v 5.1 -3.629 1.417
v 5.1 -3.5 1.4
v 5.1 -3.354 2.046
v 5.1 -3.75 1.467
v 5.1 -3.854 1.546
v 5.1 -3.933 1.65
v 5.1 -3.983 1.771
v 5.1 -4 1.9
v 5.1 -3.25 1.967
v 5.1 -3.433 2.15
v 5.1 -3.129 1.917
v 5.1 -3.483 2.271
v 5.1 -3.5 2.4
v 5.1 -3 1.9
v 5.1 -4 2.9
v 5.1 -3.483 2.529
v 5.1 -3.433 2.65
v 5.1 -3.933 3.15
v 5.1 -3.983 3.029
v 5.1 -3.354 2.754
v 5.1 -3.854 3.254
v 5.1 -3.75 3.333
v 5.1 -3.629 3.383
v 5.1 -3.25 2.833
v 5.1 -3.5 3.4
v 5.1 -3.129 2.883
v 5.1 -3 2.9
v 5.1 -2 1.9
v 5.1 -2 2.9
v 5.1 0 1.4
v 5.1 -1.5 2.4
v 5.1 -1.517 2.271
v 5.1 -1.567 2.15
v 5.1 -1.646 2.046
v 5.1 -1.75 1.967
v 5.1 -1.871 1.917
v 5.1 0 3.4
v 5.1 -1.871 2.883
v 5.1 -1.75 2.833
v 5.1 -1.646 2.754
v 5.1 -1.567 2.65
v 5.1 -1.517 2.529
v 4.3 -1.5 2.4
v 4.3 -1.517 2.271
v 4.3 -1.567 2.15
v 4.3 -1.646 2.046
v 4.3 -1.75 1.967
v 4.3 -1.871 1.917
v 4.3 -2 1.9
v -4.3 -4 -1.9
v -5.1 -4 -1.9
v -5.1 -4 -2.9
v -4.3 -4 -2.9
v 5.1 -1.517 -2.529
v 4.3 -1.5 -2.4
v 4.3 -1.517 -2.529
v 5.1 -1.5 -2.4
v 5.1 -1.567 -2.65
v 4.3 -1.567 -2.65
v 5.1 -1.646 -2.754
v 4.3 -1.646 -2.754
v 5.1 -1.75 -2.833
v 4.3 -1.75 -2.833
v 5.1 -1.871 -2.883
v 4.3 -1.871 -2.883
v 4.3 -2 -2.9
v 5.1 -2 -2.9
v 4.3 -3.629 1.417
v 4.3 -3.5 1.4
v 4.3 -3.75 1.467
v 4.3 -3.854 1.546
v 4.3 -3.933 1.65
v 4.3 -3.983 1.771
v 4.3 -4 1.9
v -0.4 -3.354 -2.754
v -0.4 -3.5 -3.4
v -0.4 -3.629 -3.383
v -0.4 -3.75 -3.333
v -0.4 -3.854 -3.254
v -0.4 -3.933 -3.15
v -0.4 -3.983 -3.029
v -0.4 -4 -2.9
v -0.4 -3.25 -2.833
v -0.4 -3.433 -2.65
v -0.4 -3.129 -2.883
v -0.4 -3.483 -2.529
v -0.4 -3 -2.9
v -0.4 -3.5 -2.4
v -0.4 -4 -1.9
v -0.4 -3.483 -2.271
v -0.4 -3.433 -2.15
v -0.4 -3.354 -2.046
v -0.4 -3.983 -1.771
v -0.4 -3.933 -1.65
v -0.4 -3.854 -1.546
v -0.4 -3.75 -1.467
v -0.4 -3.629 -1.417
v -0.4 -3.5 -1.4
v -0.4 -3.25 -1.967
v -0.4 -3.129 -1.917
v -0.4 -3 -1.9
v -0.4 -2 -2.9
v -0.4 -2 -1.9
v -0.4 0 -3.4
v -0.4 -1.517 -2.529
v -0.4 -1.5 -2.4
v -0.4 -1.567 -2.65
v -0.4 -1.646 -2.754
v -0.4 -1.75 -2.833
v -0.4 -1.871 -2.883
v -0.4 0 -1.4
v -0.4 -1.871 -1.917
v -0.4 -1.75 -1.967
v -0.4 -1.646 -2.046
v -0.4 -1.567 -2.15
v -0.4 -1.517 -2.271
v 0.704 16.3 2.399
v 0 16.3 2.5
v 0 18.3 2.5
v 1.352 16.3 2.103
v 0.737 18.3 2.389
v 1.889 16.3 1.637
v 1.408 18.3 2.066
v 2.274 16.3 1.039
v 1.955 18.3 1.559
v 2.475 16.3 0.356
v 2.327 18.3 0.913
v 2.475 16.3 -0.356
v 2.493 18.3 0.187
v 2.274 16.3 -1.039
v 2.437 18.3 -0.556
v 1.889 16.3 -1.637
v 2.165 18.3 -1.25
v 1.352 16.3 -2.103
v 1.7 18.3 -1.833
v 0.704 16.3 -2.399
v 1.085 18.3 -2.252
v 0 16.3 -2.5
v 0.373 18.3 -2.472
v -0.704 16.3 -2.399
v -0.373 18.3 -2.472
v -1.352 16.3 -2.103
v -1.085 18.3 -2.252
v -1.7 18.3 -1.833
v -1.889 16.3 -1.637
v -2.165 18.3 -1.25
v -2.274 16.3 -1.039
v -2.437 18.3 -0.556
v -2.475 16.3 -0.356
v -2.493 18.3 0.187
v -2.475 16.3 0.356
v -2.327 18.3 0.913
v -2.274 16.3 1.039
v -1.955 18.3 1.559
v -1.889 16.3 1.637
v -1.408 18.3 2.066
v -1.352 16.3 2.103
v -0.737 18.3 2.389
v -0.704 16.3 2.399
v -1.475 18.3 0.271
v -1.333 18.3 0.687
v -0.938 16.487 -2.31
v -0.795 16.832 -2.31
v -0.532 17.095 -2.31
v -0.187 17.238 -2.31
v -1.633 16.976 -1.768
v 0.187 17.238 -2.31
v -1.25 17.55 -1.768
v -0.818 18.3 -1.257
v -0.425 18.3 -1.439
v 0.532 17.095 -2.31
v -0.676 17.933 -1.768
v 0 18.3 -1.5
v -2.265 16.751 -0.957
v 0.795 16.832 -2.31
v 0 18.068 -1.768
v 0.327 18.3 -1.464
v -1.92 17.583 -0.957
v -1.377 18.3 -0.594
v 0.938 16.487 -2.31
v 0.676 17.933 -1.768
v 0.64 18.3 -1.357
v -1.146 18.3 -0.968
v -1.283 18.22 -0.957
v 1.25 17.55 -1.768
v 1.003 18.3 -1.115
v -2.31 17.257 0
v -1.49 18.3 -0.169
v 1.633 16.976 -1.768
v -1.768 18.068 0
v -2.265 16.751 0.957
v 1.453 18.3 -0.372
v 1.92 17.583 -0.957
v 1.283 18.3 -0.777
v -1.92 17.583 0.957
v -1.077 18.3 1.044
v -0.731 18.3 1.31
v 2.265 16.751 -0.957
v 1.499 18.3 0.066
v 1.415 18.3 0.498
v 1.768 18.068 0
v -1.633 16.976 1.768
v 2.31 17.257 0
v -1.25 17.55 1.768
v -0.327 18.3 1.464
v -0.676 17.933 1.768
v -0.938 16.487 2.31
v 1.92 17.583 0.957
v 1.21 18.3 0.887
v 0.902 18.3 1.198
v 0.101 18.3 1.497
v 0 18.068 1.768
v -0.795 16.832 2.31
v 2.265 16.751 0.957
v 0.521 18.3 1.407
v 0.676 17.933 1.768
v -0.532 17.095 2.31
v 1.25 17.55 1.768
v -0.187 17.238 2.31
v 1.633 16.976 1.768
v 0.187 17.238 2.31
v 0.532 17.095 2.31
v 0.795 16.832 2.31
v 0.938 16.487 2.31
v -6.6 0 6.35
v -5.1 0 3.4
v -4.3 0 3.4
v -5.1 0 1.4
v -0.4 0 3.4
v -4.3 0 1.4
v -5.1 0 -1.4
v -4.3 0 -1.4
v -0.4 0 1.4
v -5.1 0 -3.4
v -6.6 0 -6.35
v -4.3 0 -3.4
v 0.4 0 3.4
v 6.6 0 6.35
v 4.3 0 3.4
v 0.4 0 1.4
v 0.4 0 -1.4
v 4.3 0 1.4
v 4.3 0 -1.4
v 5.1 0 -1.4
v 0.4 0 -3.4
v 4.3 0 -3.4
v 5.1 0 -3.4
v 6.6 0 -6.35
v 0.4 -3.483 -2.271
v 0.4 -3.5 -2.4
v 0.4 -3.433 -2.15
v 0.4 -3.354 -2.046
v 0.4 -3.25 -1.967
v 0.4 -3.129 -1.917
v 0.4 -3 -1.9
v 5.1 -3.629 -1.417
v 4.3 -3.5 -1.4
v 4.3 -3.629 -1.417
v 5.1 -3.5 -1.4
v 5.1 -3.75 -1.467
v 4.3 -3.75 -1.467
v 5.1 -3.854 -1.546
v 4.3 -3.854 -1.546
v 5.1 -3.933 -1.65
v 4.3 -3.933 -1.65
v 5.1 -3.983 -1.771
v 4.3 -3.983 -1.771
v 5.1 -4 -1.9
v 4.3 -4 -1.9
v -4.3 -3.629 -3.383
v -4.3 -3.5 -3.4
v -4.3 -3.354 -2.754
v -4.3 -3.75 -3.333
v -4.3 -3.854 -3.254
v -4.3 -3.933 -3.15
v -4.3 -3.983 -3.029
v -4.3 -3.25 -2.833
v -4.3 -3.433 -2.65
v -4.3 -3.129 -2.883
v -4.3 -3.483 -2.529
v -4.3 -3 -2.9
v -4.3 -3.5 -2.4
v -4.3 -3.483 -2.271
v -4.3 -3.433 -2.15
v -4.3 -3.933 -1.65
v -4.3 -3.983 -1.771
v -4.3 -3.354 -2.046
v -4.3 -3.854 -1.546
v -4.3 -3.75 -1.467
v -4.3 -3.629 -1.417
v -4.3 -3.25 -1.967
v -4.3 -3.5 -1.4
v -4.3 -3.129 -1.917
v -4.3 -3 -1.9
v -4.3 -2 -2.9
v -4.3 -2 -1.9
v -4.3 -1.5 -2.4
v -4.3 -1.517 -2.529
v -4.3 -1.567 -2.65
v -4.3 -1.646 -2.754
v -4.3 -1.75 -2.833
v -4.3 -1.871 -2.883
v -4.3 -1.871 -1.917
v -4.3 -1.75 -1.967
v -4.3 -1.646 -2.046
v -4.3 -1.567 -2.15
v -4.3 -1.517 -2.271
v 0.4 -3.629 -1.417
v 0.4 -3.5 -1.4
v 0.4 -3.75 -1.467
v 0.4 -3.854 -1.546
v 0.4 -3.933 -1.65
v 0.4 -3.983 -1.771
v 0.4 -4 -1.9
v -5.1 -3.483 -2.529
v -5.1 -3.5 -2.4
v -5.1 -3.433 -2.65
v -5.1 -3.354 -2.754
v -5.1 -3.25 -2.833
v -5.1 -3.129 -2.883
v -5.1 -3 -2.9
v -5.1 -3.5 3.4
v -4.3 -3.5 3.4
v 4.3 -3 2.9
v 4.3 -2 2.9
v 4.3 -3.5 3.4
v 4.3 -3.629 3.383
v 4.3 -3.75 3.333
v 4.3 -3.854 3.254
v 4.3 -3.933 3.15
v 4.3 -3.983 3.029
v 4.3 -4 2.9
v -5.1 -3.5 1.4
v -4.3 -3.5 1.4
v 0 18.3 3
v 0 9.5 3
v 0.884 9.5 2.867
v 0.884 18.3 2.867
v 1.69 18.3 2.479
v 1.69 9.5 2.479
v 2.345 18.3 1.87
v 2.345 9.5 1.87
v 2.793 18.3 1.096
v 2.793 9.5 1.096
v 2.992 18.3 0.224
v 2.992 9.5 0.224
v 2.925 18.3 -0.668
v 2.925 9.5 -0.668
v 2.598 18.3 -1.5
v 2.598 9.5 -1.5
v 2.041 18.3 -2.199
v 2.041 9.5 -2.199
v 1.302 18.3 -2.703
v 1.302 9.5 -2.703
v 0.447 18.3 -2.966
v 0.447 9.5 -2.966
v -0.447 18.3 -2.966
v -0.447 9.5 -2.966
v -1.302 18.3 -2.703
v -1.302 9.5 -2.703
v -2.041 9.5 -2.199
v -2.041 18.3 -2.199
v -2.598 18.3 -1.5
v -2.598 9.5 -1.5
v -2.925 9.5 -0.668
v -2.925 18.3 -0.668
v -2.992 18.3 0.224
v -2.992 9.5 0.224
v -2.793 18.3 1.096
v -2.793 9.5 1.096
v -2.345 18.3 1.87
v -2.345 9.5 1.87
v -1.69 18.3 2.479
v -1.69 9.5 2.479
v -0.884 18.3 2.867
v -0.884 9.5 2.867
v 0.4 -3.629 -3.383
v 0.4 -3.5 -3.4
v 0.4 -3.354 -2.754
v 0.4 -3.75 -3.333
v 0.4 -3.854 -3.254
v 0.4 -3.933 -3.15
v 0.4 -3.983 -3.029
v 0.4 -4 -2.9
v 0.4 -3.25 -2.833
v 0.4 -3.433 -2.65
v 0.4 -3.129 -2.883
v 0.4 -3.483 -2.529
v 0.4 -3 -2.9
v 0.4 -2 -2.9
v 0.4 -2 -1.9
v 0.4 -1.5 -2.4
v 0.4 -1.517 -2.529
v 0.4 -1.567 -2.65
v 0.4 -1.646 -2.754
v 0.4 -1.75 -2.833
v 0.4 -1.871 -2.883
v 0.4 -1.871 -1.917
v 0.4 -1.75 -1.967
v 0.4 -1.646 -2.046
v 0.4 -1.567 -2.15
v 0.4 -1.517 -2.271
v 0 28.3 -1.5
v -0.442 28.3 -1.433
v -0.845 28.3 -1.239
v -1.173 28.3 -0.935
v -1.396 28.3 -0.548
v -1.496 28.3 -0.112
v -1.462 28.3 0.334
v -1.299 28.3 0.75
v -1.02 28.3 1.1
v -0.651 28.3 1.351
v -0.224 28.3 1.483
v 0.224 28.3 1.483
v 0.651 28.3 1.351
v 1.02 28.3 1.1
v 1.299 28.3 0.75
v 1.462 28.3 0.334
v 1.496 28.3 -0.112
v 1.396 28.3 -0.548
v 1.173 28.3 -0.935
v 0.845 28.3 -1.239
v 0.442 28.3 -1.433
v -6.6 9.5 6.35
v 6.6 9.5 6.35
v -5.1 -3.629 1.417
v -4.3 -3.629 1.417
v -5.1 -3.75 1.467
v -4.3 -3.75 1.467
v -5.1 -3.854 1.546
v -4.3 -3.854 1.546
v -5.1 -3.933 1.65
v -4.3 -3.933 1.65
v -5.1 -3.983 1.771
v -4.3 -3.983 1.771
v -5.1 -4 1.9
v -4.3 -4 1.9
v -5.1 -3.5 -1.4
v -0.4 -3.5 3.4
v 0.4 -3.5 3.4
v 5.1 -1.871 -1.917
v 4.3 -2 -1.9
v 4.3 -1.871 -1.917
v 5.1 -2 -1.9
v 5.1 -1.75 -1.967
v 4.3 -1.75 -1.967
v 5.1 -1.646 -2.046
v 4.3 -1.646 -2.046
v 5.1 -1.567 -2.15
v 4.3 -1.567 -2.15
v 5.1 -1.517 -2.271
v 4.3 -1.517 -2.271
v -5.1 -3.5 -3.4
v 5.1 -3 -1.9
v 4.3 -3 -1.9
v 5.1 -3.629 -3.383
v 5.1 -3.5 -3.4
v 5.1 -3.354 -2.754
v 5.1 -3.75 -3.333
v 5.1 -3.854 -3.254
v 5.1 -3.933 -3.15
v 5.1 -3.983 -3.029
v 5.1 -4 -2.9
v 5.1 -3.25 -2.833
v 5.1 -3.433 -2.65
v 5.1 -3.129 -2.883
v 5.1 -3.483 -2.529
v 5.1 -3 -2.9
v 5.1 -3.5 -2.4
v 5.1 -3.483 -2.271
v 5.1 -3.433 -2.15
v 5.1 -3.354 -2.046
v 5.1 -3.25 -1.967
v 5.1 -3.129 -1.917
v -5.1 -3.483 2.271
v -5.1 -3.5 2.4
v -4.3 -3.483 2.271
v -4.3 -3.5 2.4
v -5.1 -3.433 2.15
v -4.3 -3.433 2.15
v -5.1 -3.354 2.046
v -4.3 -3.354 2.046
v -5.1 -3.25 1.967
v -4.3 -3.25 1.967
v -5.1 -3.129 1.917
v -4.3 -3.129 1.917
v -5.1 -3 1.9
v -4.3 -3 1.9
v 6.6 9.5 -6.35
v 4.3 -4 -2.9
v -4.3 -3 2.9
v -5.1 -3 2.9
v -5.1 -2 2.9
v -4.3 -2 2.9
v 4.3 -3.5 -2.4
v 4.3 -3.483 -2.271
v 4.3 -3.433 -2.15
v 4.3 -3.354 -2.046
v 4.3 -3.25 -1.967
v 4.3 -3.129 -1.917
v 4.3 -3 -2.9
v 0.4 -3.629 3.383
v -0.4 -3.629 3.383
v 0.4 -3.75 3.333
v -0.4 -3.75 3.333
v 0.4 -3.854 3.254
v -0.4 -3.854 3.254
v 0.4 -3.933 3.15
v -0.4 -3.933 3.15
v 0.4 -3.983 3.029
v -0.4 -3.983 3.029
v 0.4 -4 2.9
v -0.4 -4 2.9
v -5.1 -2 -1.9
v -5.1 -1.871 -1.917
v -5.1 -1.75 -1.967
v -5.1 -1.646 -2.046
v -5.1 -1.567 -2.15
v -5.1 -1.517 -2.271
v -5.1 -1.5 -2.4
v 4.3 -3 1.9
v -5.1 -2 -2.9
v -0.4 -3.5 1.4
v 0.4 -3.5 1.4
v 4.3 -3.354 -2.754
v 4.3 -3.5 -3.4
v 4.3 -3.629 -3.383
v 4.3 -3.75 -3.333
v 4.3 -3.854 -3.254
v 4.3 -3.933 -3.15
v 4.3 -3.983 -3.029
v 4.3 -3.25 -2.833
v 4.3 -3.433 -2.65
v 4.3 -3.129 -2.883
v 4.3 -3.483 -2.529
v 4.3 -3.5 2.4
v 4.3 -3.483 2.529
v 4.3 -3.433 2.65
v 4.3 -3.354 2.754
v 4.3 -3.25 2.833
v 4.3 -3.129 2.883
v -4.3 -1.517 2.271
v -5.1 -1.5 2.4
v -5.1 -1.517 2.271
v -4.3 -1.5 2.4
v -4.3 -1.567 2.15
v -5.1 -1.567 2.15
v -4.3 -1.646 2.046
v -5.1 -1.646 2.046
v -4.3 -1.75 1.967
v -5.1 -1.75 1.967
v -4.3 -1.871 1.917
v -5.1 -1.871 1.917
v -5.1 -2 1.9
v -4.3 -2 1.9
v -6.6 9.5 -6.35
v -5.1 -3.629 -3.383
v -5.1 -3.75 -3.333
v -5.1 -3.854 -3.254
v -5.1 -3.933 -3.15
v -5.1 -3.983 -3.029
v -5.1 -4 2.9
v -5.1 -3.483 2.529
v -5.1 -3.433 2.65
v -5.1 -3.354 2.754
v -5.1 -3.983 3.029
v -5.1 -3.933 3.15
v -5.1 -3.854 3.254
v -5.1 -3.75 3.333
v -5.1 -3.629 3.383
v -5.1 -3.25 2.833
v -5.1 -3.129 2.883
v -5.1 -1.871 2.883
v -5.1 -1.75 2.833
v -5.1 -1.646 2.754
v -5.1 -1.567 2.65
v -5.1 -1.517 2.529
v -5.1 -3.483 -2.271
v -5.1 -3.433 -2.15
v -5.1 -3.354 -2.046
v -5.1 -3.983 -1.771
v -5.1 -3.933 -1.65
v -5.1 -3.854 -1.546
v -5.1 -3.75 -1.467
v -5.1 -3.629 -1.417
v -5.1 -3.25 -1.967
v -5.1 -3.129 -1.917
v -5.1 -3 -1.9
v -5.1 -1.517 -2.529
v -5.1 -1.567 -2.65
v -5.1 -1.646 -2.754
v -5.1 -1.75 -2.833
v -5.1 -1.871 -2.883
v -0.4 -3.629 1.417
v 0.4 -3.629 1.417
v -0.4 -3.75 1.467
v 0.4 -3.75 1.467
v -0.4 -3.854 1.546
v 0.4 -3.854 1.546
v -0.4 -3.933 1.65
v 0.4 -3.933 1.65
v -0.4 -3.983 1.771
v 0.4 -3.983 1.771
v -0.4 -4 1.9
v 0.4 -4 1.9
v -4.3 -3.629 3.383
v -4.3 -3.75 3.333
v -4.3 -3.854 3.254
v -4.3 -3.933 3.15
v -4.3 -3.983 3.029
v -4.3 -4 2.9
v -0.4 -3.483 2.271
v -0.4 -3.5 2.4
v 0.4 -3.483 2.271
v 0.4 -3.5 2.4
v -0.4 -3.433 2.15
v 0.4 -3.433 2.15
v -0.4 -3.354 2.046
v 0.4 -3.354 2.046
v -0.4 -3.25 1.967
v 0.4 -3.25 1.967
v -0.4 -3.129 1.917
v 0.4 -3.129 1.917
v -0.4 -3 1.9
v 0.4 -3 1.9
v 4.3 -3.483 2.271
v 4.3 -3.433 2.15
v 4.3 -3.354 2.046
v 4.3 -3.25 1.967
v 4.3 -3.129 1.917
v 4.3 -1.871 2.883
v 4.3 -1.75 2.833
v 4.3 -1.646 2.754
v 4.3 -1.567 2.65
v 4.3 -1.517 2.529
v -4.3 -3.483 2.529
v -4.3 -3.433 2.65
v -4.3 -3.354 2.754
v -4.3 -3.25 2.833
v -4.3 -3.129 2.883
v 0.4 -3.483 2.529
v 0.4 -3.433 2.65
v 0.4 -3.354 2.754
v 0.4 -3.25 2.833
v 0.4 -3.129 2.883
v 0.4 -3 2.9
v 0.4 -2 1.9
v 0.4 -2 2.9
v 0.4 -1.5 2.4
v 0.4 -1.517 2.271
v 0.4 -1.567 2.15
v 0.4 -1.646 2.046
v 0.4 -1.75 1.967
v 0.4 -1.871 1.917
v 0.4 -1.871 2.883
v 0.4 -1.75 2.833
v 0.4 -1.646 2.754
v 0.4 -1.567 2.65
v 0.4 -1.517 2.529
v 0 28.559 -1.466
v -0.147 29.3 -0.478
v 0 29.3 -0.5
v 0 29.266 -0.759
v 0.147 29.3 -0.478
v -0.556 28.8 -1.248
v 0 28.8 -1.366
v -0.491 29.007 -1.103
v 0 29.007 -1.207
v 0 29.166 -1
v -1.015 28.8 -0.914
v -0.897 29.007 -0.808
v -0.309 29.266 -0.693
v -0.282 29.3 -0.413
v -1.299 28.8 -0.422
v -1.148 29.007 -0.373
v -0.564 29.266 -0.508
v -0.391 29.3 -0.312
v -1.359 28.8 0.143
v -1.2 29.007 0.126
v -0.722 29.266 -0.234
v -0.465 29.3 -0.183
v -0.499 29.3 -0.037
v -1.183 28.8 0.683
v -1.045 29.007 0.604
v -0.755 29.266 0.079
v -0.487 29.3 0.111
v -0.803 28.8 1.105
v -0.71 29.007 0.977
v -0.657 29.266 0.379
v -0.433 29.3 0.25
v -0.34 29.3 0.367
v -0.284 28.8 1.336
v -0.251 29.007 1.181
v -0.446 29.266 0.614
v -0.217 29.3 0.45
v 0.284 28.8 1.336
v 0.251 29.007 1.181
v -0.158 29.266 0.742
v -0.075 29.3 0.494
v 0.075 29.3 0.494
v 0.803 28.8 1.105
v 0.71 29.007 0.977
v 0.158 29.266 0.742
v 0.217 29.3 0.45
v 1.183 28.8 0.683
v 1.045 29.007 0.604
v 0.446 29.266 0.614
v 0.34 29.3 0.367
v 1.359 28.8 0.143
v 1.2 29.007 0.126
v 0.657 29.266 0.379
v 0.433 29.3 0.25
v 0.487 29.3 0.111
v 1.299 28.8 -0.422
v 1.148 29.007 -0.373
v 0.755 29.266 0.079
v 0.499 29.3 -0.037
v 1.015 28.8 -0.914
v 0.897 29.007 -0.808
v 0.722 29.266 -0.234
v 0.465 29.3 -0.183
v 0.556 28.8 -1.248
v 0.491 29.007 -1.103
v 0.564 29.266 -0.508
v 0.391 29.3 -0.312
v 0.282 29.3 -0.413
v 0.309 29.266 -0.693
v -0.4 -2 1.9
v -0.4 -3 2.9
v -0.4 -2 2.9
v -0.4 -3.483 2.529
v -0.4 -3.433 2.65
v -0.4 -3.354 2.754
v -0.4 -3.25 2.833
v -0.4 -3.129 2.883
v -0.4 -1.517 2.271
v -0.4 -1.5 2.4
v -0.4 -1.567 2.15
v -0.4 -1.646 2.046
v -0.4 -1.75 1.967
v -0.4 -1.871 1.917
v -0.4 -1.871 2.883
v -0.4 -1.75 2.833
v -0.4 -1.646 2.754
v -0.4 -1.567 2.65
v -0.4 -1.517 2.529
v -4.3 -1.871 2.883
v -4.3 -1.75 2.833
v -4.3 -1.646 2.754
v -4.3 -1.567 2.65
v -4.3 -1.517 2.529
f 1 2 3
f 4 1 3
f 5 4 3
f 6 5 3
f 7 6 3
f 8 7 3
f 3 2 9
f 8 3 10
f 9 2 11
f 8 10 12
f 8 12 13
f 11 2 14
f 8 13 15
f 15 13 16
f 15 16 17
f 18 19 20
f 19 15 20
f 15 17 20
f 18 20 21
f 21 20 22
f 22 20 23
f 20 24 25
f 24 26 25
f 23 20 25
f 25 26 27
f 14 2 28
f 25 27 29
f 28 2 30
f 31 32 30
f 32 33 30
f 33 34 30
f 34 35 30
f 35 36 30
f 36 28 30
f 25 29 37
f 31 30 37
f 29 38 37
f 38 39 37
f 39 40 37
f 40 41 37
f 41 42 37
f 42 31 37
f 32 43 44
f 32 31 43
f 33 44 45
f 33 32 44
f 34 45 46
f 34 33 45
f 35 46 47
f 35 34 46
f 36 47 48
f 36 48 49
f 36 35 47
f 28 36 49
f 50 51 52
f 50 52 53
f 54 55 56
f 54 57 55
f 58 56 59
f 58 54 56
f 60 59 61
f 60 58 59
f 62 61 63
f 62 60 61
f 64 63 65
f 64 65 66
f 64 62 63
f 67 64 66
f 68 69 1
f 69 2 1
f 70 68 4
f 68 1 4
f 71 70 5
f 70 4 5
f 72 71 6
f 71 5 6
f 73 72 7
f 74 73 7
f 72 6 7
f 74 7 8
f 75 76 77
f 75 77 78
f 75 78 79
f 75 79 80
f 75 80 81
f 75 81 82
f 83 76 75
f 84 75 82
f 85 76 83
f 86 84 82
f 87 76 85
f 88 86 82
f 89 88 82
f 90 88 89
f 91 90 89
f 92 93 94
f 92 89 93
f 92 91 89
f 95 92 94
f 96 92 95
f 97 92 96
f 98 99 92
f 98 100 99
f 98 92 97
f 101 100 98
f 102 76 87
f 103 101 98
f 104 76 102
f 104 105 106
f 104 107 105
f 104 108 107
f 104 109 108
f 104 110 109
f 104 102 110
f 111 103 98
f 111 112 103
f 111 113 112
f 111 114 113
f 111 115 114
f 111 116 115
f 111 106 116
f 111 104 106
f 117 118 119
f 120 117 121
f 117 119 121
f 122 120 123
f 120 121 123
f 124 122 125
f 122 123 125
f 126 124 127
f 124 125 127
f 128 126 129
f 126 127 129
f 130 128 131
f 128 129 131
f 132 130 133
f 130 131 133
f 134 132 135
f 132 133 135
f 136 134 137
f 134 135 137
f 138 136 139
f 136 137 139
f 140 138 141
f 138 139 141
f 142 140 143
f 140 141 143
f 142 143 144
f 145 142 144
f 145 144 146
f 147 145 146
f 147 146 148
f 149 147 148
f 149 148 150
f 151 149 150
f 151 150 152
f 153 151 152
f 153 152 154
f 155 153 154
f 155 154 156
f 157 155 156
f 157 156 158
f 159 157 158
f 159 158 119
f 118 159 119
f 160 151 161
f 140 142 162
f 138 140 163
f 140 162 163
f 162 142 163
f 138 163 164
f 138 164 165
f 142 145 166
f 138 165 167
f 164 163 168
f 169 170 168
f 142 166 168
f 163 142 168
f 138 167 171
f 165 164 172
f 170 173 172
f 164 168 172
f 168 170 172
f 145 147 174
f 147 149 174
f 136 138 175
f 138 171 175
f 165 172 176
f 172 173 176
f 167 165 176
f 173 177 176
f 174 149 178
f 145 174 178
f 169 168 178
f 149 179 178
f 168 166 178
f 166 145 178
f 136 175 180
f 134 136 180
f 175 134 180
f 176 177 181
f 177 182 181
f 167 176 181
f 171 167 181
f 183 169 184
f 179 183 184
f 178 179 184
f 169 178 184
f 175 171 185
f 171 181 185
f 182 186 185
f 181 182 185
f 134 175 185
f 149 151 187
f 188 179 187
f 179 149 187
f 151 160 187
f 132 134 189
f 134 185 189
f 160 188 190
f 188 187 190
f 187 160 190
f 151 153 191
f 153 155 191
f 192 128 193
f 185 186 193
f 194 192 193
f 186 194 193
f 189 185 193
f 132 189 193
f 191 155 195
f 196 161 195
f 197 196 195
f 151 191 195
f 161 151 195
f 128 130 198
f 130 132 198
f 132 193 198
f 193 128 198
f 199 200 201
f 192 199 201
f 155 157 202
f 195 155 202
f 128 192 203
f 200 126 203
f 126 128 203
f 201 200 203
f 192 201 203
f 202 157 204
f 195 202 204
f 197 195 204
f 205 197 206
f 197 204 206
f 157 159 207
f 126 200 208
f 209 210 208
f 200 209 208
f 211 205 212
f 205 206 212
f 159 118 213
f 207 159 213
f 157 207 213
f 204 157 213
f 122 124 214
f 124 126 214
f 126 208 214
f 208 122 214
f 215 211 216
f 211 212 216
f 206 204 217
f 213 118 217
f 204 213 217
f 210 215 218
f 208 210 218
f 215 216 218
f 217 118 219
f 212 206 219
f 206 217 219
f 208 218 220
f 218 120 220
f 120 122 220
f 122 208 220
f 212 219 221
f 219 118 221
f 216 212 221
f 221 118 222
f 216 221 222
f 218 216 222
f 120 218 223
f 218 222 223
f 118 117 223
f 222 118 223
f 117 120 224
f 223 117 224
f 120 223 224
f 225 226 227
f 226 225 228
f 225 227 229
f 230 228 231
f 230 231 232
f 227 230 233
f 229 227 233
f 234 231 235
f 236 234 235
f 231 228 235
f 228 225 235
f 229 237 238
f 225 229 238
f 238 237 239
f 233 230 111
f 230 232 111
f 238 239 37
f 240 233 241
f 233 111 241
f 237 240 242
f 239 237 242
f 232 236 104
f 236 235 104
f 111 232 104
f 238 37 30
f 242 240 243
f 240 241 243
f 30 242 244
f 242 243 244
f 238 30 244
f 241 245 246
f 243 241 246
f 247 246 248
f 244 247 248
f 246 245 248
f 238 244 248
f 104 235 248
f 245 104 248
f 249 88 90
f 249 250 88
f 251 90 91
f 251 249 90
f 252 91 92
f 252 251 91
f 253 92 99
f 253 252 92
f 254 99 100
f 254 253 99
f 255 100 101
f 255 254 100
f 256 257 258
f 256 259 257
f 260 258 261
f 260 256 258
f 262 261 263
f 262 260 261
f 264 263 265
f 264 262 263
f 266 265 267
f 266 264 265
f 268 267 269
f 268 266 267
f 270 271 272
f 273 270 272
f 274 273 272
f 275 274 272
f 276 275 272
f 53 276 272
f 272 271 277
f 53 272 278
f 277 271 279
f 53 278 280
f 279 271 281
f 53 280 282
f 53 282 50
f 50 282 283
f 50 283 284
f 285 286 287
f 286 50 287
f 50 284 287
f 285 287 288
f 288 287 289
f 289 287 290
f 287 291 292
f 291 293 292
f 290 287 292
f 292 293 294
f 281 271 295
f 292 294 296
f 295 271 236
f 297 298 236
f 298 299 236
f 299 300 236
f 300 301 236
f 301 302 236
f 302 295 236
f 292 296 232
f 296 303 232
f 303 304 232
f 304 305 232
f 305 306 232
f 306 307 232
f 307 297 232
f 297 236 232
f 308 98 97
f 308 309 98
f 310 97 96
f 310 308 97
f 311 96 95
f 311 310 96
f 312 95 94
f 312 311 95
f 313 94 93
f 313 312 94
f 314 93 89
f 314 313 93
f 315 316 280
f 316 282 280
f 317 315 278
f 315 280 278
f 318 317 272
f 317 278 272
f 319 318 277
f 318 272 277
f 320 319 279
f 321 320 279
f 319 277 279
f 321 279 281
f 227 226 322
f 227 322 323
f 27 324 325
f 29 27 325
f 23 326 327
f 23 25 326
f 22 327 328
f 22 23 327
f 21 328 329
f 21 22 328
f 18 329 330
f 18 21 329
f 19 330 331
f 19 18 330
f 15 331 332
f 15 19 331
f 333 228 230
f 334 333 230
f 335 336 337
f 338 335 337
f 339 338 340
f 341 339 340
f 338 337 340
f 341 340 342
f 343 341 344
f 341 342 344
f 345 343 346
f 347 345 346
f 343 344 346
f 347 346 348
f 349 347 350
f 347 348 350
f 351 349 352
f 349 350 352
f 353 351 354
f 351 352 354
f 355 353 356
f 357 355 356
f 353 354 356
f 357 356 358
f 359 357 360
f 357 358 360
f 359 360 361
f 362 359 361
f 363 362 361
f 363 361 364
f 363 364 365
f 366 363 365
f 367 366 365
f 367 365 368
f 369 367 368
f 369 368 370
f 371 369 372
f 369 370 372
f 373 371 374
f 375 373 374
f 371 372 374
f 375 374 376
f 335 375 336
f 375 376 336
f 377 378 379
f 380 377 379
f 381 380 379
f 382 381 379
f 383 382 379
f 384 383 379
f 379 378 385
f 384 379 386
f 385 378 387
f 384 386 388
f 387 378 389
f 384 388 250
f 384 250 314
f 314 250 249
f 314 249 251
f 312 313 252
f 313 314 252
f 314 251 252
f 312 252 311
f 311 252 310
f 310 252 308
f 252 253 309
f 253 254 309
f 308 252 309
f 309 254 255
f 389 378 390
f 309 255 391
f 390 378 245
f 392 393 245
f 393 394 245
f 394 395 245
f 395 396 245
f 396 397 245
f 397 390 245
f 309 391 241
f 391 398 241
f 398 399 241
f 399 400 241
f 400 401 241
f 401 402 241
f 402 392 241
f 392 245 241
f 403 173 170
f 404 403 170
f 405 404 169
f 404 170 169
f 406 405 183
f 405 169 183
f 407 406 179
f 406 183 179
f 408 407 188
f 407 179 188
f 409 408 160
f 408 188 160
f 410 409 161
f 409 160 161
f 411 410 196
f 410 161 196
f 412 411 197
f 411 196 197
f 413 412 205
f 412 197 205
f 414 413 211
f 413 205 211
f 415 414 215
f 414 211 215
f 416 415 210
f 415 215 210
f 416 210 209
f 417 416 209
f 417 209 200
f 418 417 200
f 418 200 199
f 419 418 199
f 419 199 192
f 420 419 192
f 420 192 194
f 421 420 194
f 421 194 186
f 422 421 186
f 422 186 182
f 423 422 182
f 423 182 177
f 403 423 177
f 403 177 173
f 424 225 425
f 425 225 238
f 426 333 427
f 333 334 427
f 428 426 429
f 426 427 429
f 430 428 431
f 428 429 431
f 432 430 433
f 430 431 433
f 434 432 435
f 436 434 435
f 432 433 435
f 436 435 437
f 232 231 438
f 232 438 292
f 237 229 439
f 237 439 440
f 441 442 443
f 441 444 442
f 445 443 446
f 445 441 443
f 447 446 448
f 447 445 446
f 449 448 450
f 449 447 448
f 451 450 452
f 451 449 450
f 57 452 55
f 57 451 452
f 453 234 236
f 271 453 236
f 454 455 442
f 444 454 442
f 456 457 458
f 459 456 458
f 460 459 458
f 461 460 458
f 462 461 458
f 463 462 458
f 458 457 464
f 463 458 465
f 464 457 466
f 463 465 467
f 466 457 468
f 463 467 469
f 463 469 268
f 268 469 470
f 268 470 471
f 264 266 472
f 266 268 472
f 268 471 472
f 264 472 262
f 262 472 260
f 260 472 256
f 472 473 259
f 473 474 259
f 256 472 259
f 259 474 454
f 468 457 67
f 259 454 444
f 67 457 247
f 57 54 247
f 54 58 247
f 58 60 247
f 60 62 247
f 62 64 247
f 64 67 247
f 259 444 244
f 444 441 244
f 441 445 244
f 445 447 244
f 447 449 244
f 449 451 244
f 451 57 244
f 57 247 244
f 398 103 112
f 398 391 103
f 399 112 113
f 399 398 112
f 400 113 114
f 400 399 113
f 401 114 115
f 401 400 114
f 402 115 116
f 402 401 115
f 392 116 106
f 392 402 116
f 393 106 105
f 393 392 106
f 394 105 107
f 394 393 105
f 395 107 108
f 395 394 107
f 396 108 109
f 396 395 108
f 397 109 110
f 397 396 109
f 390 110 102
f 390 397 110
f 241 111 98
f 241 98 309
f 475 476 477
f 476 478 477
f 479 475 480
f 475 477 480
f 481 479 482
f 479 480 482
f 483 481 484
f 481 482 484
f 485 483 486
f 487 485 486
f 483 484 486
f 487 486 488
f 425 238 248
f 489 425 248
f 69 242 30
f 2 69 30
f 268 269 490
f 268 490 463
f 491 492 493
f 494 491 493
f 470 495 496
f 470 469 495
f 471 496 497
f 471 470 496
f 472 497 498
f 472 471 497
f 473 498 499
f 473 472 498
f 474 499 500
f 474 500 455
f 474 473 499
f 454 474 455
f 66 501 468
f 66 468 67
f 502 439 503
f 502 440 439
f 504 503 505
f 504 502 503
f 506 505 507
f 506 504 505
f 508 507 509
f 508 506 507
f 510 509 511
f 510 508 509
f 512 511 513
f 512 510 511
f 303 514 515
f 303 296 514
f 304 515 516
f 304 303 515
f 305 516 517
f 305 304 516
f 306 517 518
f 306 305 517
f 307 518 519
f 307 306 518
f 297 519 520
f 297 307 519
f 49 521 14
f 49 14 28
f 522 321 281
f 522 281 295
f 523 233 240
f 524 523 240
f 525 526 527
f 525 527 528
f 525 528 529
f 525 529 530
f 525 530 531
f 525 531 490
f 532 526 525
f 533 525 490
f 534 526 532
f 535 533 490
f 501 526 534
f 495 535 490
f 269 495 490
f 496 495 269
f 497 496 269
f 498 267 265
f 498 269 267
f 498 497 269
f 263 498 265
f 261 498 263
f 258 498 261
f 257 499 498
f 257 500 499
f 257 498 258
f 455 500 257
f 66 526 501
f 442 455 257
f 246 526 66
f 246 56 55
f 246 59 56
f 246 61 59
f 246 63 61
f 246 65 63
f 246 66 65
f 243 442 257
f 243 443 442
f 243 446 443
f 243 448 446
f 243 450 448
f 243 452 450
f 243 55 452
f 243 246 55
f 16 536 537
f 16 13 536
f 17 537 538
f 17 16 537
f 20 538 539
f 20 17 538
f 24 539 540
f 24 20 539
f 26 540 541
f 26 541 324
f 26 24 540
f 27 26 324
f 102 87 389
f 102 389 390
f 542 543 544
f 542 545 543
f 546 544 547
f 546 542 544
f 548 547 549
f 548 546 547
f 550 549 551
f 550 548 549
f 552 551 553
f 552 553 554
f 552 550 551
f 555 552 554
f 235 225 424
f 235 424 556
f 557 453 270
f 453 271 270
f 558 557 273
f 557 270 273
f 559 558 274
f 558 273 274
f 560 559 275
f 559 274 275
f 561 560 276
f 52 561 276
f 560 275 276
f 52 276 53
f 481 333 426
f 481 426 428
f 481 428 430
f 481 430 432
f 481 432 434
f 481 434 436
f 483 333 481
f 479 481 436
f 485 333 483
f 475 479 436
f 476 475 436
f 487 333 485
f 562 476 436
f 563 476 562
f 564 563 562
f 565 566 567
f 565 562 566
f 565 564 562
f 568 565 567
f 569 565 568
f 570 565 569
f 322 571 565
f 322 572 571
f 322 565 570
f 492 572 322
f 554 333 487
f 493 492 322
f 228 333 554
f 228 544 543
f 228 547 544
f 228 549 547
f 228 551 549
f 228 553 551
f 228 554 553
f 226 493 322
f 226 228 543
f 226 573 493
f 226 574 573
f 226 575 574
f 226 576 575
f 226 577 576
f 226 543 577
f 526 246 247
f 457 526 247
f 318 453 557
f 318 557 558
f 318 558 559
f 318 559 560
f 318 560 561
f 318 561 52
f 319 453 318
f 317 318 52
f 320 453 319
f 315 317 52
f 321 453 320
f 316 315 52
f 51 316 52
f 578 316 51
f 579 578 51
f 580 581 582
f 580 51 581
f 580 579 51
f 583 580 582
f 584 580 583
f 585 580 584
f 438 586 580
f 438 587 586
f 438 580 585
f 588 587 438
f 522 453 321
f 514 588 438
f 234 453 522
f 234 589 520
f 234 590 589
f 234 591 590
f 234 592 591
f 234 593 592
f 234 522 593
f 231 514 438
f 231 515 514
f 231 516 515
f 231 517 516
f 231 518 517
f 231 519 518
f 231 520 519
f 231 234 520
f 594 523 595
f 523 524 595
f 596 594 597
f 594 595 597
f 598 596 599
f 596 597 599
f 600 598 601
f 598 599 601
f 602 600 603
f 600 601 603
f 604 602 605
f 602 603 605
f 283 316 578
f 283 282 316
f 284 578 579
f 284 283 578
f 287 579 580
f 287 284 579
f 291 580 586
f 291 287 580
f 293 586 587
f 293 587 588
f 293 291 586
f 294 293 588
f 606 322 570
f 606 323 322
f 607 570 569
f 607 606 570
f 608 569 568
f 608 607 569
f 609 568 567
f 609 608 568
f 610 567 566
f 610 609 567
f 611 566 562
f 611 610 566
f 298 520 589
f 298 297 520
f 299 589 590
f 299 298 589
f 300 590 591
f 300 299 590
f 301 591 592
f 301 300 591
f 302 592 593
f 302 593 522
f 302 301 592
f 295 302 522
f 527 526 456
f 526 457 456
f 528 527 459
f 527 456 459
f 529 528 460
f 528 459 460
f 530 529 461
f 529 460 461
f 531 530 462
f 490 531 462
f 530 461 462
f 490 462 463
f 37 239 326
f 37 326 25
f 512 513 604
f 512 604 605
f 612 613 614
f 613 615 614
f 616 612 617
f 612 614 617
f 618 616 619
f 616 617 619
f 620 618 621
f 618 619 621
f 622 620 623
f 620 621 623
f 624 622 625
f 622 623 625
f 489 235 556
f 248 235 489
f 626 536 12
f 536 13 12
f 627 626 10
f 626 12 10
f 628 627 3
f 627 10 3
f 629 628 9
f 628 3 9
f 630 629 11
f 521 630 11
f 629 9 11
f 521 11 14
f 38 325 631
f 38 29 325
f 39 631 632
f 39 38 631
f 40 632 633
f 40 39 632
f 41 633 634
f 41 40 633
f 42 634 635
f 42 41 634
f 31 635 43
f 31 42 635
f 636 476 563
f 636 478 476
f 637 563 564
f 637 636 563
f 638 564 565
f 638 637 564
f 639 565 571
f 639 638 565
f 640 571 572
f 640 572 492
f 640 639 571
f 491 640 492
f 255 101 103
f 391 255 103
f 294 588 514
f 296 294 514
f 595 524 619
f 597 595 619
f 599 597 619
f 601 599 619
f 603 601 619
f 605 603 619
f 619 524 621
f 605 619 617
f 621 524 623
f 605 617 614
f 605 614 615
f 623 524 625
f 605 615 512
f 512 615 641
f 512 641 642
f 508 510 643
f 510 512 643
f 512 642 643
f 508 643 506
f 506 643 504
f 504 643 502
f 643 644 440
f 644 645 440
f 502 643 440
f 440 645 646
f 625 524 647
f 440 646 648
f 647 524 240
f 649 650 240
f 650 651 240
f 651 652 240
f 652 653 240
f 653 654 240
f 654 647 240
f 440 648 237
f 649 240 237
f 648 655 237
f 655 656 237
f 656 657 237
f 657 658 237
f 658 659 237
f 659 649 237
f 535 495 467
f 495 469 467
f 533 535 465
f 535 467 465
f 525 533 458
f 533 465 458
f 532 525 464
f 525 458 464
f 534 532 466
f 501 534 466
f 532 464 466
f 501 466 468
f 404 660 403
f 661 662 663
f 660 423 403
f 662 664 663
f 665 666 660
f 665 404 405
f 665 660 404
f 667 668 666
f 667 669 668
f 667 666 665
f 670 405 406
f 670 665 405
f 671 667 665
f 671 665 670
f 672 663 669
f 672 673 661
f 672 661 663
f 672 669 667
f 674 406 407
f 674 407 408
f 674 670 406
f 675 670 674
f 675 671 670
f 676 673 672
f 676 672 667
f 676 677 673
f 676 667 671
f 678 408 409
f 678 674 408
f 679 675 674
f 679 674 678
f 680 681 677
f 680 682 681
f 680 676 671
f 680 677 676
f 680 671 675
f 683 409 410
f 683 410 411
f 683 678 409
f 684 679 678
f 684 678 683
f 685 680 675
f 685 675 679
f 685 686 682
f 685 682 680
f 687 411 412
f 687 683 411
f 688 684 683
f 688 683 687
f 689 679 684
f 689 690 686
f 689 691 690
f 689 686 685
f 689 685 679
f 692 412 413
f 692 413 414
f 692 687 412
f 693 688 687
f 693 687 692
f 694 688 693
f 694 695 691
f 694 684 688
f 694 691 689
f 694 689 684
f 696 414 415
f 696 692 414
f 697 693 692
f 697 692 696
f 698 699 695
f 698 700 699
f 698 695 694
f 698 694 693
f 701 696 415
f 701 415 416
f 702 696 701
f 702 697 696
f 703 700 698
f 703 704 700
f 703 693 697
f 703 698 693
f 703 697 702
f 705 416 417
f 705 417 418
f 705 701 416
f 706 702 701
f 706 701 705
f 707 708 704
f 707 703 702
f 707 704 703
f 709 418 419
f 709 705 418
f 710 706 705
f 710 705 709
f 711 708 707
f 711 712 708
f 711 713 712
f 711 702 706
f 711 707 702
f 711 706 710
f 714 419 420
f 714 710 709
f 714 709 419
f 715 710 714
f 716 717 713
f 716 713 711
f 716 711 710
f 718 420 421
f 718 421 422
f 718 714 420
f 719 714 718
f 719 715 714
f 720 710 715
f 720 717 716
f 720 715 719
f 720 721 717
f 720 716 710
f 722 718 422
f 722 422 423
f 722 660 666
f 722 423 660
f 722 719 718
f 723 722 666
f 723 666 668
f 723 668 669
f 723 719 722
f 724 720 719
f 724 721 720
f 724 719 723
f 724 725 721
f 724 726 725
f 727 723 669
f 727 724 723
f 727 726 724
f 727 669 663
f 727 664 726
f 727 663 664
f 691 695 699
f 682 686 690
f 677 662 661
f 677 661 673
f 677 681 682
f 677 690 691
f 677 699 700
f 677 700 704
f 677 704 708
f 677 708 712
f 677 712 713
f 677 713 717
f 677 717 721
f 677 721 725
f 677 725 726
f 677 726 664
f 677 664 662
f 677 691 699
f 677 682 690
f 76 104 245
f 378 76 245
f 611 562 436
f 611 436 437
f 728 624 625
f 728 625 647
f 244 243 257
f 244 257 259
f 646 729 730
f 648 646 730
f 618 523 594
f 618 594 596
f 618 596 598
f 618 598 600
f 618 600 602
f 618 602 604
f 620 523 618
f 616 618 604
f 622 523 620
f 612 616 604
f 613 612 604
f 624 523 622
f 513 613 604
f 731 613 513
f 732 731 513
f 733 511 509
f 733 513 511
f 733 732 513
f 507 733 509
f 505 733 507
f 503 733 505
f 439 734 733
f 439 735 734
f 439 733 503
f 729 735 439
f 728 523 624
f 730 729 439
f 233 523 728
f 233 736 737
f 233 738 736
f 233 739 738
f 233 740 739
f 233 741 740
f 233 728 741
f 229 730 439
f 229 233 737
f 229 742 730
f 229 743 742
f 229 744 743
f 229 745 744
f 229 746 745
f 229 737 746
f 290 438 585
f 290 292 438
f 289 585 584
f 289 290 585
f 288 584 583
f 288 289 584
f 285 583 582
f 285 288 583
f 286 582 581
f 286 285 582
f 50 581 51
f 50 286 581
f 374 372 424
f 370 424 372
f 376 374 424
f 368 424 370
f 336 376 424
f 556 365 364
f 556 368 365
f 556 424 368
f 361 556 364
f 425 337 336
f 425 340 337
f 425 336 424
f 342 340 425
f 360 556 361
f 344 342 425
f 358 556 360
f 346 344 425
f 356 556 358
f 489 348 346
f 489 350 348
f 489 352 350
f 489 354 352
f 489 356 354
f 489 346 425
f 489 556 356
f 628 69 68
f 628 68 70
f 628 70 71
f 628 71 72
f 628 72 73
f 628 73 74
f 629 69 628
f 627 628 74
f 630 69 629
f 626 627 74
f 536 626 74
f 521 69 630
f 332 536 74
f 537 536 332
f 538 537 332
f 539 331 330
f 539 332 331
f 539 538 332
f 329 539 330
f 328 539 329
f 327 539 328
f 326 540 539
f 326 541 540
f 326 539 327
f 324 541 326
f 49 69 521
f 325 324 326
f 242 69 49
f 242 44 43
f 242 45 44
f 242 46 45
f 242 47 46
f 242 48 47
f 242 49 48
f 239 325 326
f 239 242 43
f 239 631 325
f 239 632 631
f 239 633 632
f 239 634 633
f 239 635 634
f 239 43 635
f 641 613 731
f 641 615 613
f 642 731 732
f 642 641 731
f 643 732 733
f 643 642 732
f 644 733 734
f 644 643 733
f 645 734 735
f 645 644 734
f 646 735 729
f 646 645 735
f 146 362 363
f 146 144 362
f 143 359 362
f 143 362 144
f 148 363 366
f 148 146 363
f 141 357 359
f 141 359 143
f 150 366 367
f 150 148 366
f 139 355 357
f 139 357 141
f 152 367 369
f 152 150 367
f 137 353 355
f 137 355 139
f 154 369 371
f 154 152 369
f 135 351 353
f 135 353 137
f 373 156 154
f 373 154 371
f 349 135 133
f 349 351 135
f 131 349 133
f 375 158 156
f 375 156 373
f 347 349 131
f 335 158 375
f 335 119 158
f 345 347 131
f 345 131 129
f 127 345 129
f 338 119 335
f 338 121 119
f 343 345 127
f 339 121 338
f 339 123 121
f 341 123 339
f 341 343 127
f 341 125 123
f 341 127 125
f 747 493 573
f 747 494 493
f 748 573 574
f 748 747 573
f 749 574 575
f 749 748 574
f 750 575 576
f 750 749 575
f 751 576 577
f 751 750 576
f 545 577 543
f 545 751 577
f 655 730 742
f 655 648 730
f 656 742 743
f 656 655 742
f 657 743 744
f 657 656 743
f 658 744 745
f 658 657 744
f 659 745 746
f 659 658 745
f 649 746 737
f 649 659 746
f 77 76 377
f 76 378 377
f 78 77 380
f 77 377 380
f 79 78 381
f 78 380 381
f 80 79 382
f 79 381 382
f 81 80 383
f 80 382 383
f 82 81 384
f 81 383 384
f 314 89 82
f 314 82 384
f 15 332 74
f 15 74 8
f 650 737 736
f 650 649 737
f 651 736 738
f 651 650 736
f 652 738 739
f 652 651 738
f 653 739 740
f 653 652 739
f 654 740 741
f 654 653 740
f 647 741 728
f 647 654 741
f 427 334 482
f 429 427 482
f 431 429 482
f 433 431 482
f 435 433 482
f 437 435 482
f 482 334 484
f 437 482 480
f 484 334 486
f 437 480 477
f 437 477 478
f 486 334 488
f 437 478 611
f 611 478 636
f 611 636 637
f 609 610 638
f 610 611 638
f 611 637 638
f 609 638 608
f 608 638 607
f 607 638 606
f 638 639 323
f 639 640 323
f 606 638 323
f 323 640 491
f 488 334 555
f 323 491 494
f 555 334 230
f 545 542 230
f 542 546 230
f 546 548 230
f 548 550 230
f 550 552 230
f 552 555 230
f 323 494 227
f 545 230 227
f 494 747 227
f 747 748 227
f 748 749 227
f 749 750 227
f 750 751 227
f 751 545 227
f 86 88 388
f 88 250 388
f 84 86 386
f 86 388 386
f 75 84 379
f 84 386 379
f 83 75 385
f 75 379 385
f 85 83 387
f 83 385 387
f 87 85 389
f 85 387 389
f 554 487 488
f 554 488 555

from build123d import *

# Parameters (mm, degrees)
SKETCH1_W           = 13.2
SKETCH1_H           = 12.7
BOSS_EXTRUDE1_DEPTH = 9.5
SKETCH2_R           = 3
BOSS_EXTRUDE2_DEPTH = 8.8
SKETCH4_R           = 2.5
CUT_EXTRUDE1_DEPTH  = 2
SKETCH5_R           = 1.5
BOSS_EXTRUDE3_DEPTH = 13
REVOLVE2_ANGLE      = 180
FILLET1_R           = 1
SKETCH6_W           = 0.8
SKETCH6_H           = 2
BOSS_EXTRUDE4_DEPTH = 4
SKETCH7_W           = 1
SKETCH7_H           = 2
CUT_EXTRUDE2_DEPTH  = 33.182332109
FILLET2_R           = 0.5


with BuildPart() as part:
    # Sketch1 → Boss-Extrude1 (new body)
    with BuildSketch(Plane(origin=(0, 0, 0), x_dir=(1, 0, 0), z_dir=(0, 1, 0))):
        Rectangle(SKETCH1_W, SKETCH1_H)
    extrude(amount=BOSS_EXTRUDE1_DEPTH)

    # Sketch2 → Boss-Extrude2 (add)
    with BuildSketch(Plane(origin=(0, 9.5, 0), x_dir=(1, 0, 0), z_dir=(0, 1, 0))):
        with Locations(Location((0, 0, 0), (0, 0, 270))):
            Circle(SKETCH2_R)
    extrude(amount=BOSS_EXTRUDE2_DEPTH)

    # Sketch4 → Cut-Extrude1 (cut)
    with BuildSketch(Plane(origin=(0, 18.3, 0), x_dir=(1, 0, 0), z_dir=(0, 1, 0))):
        with Locations(Location((0, 0, 0), (0, 0, 270))):
            Circle(SKETCH4_R)
    extrude(amount=-CUT_EXTRUDE1_DEPTH, mode=Mode.SUBTRACT)

    # Sketch5 → Boss-Extrude3 (add)
    with BuildSketch(Plane(origin=(0, 16.3, 0), x_dir=(1, 0, 0), z_dir=(0, 1, 0))):
        with Locations(Location((0, 0, 0), (0, 0, 90))):
            Circle(SKETCH5_R)
    extrude(amount=BOSS_EXTRUDE3_DEPTH)

    # Sketch3 → Revolve2 (revolve)
    with BuildSketch(Plane(origin=(0, 16.3, 0), x_dir=(1, 0, 0), z_dir=(0, 1, 0))):
        with BuildLine():
            Line((0, -2.5), (0, 2.5))
            ThreePointArc((0, 2.5), (-2.5, 0), (0, -2.5))
        make_face()
    revolve(axis=Axis((0, 16.3, 3), (0, 0, -1)), revolution_arc=REVOLVE2_ANGLE)

    # Fillet1
    fillet1_edges = [part.edges().sort_by_distance(p)[0] for p in [
        (0, 29.3, 1.5),
    ]]
    fillet(fillet1_edges, radius=FILLET1_R)

    # Sketch6 → Boss-Extrude4 (add)
    with BuildSketch(Plane.XZ):
        with Locations((-4.7, 2.4)):
            Rectangle(SKETCH6_W, SKETCH6_H)
        with Locations((-4.7, -2.4)):
            Rectangle(SKETCH6_W, SKETCH6_H)
        with Locations((0, -2.4)):
            Rectangle(SKETCH6_W, SKETCH6_H)
        with Locations((0, 2.4)):
            Rectangle(SKETCH6_W, SKETCH6_H)
        with Locations((4.7, 2.4)):
            Rectangle(SKETCH6_W, SKETCH6_H)
        with Locations((4.7, -2.4)):
            Rectangle(SKETCH6_W, SKETCH6_H)
    extrude(amount=BOSS_EXTRUDE4_DEPTH)

    # Sketch7 → Cut-Extrude2 (cut, through all)
    with BuildSketch(Plane.ZY.offset(5.1)):
        with Locations((-2.4, -2.5)):
            Rectangle(SKETCH7_W, SKETCH7_H)
        with Locations((2.4, -2.5)):
            Rectangle(SKETCH7_W, SKETCH7_H)
    extrude(amount=-CUT_EXTRUDE2_DEPTH, mode=Mode.SUBTRACT)

    # Fillet2
    fillet2_edges = [part.edges().sort_by_distance(p)[0] for p in [
        (4.7, -3.5, 2.9),
        (4.7, -3.5, 1.9),
        (4.7, -3.5, -1.9),
        (4.7, -3.5, -2.9),
        (4.7, -1.5, -1.9),
        (4.7, -1.5, 2.9),
        (4.7, -1.5, 1.9),
        (4.7, -1.5, -2.9),
        (0, -1.5, 1.9),
        (0, -1.5, 2.9),
        (0, -3.5, 2.9),
        (0, -3.5, 1.9),
        (0, -3.5, -1.9),
        (0, -3.5, -2.9),
        (0, -1.5, -2.9),
        (0, -1.5, -1.9),
        (-4.7, -3.5, 2.9),
        (-4.7, -1.5, 2.9),
        (-4.7, -3.5, 1.9),
        (-4.7, -1.5, 1.9),
        (-4.7, -1.5, -1.9),
        (-4.7, -1.5, -2.9),
        (-4.7, -3.5, -1.9),
        (-4.7, -3.5, -2.9),
        (0, -4, -1.4),
        (0, -4, -3.4),
        (4.7, -4, -1.4),
        (4.7, -4, -3.4),
        (4.7, -4, 1.4),
        (4.7, -4, 3.4),
        (0, -4, 3.4),
        (0, -4, 1.4),
        (-4.7, -4, 3.4),
        (-4.7, -4, 1.4),
        (-4.7, -4, -1.4),
        (-4.7, -4, -3.4),
    ]]
    fillet(fillet2_edges, radius=FILLET2_R - 0.0001)  # a hair under: the kernel refuses the full size


solid = part.part
